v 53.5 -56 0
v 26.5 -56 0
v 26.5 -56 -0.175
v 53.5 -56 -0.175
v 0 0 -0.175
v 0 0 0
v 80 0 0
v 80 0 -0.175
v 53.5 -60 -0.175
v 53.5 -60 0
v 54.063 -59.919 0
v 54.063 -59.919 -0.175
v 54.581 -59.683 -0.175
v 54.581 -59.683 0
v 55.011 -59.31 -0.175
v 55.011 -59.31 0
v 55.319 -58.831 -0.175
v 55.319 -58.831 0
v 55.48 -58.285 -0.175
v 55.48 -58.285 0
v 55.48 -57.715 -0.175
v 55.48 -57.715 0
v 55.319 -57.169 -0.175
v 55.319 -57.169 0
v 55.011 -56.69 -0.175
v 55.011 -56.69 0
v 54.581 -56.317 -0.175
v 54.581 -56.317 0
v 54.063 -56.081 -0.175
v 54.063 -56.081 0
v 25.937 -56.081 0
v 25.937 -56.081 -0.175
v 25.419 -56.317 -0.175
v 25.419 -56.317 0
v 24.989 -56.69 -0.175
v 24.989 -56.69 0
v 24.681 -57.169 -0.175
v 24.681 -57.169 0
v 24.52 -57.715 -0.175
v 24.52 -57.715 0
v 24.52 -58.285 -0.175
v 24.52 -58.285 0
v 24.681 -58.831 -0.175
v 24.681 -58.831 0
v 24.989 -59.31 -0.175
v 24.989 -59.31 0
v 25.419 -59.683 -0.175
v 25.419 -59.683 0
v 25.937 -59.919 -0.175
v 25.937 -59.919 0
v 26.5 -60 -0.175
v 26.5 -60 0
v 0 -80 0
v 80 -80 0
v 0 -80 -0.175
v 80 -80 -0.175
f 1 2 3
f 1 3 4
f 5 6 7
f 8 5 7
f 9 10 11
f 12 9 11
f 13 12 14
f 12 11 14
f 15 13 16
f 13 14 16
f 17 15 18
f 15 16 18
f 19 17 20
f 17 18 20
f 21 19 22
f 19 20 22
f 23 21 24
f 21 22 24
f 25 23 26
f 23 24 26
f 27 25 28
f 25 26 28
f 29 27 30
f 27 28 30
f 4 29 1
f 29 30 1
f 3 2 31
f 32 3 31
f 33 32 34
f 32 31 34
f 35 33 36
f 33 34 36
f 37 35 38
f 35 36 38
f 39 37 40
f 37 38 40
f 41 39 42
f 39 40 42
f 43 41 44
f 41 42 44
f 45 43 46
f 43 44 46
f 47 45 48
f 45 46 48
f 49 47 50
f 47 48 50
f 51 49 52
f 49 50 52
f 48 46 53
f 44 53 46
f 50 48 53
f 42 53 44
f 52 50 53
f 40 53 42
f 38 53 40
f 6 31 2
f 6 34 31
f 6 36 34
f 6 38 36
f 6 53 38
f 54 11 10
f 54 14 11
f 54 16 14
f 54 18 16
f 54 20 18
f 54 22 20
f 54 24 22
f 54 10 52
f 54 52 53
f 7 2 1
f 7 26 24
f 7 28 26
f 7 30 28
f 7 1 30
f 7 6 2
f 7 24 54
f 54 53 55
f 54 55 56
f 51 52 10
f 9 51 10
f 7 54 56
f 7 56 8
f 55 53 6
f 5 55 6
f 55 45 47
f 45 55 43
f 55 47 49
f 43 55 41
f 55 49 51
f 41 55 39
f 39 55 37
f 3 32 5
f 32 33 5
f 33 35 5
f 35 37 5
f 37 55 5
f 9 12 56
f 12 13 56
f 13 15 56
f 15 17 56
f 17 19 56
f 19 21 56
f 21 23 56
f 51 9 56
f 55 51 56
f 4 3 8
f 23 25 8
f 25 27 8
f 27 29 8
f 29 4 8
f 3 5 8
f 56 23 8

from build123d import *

# Parameters (mm, degrees)
SKETCH_W  = 80
SKETCH_H  = 80
PAD_DEPTH = 0.175


with BuildPart() as part:
    # Sketch → Pad (new body)
    with BuildSketch(Plane.XY):
        with Locations((40, -40)):
            Rectangle(SKETCH_W, SKETCH_H)
        with BuildLine():
            ThreePointArc((26.5, -56), (24.5, -58), (26.5, -60))
            Line((26.5, -60), (53.5, -60))
            ThreePointArc((53.5, -60), (55.5, -58), (53.5, -56))
            Line((26.5, -56), (53.5, -56))
        make_face(mode=Mode.SUBTRACT)
    extrude(amount=-PAD_DEPTH)


solid = part.part
